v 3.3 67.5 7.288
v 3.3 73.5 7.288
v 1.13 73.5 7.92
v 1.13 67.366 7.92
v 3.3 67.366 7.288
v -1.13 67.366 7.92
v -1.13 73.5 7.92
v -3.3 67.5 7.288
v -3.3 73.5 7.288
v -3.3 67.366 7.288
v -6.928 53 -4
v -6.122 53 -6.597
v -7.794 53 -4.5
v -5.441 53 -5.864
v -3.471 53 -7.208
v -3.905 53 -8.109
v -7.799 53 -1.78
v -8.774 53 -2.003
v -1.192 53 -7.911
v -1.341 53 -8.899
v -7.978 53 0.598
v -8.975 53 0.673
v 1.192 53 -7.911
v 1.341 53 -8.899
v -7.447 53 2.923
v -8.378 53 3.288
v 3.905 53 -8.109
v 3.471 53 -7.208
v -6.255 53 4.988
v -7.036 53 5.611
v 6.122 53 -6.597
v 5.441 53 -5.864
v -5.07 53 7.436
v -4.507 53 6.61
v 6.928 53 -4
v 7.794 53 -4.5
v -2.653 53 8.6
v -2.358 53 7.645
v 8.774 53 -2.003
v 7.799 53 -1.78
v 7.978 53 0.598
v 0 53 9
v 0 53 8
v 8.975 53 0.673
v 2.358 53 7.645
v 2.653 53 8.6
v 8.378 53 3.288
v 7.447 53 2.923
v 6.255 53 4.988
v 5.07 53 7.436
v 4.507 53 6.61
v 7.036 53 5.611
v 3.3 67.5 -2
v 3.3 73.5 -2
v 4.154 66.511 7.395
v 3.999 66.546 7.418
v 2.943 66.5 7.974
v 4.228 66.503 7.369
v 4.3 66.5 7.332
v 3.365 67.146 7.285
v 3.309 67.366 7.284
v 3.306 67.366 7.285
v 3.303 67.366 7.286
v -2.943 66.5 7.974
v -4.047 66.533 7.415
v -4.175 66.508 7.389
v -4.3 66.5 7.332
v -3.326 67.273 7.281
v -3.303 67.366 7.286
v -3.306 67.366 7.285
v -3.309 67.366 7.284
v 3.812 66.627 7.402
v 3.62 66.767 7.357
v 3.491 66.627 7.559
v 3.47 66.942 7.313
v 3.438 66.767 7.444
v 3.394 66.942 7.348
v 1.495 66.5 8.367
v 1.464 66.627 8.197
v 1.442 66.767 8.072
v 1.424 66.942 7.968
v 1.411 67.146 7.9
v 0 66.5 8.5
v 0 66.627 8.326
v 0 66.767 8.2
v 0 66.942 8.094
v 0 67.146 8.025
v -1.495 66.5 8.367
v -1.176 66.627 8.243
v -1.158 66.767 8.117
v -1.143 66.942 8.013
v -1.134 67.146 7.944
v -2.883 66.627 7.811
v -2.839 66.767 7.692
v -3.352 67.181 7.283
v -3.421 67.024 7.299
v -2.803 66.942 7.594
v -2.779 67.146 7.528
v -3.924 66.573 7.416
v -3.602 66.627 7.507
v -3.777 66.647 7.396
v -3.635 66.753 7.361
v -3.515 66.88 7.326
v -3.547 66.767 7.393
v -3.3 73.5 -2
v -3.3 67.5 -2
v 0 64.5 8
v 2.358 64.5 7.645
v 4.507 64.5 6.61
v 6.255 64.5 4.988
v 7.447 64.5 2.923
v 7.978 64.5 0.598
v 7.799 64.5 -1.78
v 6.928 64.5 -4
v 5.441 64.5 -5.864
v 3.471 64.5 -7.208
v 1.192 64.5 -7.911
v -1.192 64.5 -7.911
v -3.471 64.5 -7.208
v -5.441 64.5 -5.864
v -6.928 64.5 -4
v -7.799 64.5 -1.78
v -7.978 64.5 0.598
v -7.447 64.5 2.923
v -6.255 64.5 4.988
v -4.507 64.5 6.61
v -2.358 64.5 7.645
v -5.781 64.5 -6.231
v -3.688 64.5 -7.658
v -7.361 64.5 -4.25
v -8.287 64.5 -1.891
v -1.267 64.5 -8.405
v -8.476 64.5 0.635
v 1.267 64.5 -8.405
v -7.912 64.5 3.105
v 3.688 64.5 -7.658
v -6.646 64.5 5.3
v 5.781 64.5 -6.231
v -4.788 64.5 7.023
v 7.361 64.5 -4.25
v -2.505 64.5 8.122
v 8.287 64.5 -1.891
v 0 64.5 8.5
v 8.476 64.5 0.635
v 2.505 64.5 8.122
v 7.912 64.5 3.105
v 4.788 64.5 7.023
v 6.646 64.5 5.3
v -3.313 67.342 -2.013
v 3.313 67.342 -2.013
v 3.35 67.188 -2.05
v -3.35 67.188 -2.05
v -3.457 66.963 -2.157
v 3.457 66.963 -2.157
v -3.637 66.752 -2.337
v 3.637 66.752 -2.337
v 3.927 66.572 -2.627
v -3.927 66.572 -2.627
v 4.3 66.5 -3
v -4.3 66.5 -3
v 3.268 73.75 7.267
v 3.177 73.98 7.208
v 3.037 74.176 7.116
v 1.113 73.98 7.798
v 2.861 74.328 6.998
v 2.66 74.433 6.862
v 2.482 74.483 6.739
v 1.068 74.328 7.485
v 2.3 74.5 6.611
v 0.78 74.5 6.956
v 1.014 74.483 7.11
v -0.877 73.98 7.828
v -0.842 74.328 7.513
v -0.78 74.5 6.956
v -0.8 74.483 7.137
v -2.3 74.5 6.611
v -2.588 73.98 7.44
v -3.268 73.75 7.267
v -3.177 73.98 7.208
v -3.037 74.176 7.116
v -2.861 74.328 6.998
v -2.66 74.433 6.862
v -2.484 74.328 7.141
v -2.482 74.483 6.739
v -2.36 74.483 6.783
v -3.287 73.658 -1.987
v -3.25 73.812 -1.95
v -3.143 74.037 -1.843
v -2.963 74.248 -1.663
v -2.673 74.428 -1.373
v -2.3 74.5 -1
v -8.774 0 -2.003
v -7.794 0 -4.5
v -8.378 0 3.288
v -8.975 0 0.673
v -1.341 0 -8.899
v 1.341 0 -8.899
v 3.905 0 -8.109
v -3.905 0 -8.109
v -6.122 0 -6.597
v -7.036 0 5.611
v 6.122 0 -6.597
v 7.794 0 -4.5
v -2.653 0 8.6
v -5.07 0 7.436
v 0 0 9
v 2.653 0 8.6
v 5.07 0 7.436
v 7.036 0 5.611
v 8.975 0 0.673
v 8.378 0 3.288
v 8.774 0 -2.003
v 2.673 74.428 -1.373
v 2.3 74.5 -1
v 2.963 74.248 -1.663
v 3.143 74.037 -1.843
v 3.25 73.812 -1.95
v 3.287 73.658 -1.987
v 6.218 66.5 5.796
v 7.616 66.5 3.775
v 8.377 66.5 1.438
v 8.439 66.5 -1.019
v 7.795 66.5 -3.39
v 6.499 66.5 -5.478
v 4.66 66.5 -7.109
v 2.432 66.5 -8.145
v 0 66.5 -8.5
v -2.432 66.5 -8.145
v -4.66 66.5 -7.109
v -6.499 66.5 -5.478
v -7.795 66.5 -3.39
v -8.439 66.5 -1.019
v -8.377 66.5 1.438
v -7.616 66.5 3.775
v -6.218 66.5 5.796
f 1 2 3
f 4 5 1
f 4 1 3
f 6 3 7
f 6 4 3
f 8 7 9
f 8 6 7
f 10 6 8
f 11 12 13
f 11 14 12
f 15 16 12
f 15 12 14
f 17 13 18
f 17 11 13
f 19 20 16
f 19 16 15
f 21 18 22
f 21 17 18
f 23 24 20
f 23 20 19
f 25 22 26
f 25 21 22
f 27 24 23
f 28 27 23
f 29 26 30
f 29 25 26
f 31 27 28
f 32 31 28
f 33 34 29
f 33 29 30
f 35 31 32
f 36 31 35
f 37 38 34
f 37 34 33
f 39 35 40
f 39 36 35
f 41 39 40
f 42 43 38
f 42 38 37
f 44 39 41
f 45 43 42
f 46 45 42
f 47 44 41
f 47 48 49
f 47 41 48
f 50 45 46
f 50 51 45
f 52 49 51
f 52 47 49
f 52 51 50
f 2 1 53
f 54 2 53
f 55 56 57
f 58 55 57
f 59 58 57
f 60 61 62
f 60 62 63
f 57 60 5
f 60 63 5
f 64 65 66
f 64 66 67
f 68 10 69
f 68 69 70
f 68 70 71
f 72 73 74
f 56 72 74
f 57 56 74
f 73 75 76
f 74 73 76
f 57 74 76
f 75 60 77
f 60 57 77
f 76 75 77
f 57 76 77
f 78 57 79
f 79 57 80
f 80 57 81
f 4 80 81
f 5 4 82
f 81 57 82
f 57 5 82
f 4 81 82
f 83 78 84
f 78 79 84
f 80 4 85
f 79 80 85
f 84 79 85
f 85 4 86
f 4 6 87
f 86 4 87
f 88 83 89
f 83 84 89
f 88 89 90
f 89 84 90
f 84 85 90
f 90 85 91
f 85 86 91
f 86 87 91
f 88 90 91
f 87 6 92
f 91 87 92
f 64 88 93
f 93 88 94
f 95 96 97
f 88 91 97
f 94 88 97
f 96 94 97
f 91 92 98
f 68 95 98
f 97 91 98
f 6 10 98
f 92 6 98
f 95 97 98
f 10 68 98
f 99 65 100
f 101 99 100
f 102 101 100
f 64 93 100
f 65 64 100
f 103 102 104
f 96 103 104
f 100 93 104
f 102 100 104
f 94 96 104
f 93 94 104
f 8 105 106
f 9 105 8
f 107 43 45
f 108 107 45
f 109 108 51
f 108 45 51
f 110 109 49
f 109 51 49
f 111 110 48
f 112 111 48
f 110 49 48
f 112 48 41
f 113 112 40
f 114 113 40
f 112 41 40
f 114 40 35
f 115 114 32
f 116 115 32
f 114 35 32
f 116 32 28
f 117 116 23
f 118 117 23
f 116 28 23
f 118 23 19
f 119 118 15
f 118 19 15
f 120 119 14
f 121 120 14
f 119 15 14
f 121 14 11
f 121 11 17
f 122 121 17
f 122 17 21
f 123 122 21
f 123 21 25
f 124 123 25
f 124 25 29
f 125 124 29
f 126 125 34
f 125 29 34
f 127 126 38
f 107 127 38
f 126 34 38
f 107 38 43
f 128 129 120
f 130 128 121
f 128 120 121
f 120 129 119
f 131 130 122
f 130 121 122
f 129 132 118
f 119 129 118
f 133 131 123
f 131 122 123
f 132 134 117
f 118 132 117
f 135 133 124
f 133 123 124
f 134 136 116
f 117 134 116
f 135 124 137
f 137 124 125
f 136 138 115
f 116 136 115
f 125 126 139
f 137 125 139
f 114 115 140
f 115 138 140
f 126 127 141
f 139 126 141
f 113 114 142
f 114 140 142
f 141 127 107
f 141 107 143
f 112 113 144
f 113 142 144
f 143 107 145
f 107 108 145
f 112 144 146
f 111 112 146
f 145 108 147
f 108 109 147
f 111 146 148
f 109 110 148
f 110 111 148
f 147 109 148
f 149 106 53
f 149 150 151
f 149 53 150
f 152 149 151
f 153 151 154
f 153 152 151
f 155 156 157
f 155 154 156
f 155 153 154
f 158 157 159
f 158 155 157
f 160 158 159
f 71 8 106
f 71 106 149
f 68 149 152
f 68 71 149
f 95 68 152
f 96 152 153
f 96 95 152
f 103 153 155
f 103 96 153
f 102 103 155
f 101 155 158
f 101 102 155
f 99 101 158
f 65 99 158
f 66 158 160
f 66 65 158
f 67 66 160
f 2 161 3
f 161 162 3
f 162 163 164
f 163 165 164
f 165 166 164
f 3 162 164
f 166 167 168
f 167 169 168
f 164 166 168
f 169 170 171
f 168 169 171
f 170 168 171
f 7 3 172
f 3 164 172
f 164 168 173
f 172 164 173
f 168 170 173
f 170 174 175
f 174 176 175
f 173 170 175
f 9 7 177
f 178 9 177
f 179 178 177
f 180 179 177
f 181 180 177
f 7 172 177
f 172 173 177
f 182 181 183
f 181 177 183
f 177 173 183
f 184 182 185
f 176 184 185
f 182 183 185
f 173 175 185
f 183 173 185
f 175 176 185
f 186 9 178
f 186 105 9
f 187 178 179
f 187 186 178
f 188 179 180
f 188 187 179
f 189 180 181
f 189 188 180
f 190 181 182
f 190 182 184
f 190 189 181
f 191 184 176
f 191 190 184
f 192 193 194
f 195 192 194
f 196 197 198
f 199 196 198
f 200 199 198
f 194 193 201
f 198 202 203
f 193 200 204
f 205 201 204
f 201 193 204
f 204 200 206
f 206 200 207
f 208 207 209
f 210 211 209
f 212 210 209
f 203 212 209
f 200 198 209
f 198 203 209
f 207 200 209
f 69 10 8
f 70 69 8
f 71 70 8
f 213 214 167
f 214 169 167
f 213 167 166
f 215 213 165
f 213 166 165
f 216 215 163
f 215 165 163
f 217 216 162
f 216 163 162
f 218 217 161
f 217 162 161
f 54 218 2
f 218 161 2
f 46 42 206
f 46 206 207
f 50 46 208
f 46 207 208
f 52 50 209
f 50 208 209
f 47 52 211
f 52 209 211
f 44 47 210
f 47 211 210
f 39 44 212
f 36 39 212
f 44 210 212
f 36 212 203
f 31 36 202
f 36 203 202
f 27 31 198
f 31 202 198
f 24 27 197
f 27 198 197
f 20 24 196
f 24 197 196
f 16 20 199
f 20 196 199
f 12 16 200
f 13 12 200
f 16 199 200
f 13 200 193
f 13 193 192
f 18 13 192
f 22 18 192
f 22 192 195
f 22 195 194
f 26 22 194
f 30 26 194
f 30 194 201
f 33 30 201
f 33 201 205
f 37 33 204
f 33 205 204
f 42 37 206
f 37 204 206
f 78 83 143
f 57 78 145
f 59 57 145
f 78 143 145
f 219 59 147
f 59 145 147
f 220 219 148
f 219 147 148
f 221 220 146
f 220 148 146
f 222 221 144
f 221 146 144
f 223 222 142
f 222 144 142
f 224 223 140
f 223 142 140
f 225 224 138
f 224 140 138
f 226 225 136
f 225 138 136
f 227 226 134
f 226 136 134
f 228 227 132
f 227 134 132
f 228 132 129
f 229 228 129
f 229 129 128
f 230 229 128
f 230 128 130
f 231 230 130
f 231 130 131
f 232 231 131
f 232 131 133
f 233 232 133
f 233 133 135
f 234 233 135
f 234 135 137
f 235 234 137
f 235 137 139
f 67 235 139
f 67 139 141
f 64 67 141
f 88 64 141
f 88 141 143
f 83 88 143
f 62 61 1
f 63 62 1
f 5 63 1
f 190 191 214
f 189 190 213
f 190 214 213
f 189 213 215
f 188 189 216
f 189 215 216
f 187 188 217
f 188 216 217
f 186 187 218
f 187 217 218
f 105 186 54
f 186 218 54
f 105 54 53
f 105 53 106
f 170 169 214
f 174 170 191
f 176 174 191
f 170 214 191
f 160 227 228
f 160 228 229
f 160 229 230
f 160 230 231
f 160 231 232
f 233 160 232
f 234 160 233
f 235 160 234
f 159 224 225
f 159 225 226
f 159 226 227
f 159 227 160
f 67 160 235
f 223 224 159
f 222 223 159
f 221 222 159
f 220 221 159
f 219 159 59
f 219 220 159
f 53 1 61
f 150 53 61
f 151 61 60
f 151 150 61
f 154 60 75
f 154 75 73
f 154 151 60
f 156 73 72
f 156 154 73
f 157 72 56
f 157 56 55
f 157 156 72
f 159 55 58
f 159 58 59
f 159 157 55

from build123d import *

# Parameters (mm, degrees)
CROQUIS1_R              = 9
SALIENTE_EXTRUIR1_DEPTH = 53
CROQUIS2_R              = 8
SALIENTE_EXTRUIR2_DEPTH = 11.5
CROQUIS3_R              = 8.5
SALIENTE_EXTRUIR3_DEPTH = 2
SALIENTE_EXTRUIR4_DEPTH = 8
REDONDEO1_R             = 1
REDONDEO2_R             = 1


with BuildPart() as part:
    # Croquis1 → Saliente-Extruir1 (new body)
    with BuildSketch(Plane(origin=(0, 0, 0), x_dir=(1, 0, 0), z_dir=(0, 1, 0))):
        with Locations(Location((0, 0, 0), (0, 0, 270))):
            Circle(CROQUIS1_R)
    extrude(amount=SALIENTE_EXTRUIR1_DEPTH)

    # Croquis2 → Saliente-Extruir2 (add)
    with BuildSketch(Plane(origin=(0, 53, 0), x_dir=(1, 0, 0), z_dir=(0, 1, 0))):
        with Locations(Location((0, 0, 0), (0, 0, 270))):
            Circle(CROQUIS2_R)
    extrude(amount=SALIENTE_EXTRUIR2_DEPTH)

    # Croquis3 → Saliente-Extruir3 (add)
    with BuildSketch(Plane(origin=(0, 64.5, 0), x_dir=(1, 0, 0), z_dir=(0, 1, 0))):
        with Locations(Location((0, 0, 0), (0, 0, 270))):
            Circle(CROQUIS3_R)
    extrude(amount=SALIENTE_EXTRUIR3_DEPTH)

    # Croquis4 → Saliente-Extruir4 (add)
    with BuildSketch(Plane(origin=(0, 66.5, 0), x_dir=(1, 0, 0), z_dir=(0, 1, 0))):
        with BuildLine():
            Line((-3.3, -7.287660804), (-3.3, 2))
            Line((-3.3, 2), (3.3, 2))
            Line((3.3, 2), (3.3, -7.287660804))
            ThreePointArc((3.3, -7.287660804), (0, -8), (-3.3, -7.287660804))
        make_face()
    extrude(amount=SALIENTE_EXTRUIR4_DEPTH)

    # Redondeo1
    # the kernel refuses this fillet: 1 mm, written as the material it adds along each edge
    with BuildSketch(Plane(origin=(0, 66.5, 0), x_dir=(0.6410468977600248, 0, 0.7675017100125893), z_dir=(0.7675017100125893, 0, -0.6410468977600248))) as redondeo1_piece_1_section:
        with BuildLine():
            CenterArc((9, -0.866025404), REDONDEO1_R, 120, 60)
            Line((8, -0.866025404), (7.98, -0.866025404))
            Line((7.98, -0.866025404), (7.98, 0))
            Line((7.98, 0), (8, 0.02))
            ThreePointArc((8, 0.02), (8.25, 0.02), (8.49, 0.017320508))
            Line((8.49, 0.017320508), (8.5, 0))
        make_face()
    redondeo1_piece_1 = revolve(axis=Axis((0, 66.5, 0), (0, -1, 0)), revolution_arc=79.739856792, mode=Mode.PRIVATE)
    redondeo1_piece_1 = split(redondeo1_piece_1, bisect_by=Plane(origin=(3.3, 66.860958569, 8.125198581), z_dir=(-1, 0, 0)), keep=Keep.TOP, mode=Mode.PRIVATE)
    redondeo1_piece_1 = split(redondeo1_piece_1, bisect_by=Plane(origin=(-3.3, 66.860958569, 8.125198581), z_dir=(1, 0, 0)), keep=Keep.TOP, mode=Mode.PRIVATE)
    add(redondeo1_piece_1)
    with BuildSketch(Plane(origin=(3.3, 66.5, -2), x_dir=(1, 0, 0), z_dir=(0, 0, 1))) as redondeo1_piece_2_section:
        with BuildLine():
            CenterArc((REDONDEO1_R, REDONDEO1_R), REDONDEO1_R, 180, 90)
            Line((0, REDONDEO1_R), (-REDONDEO1_R * 0.02, REDONDEO1_R))
            Line((-REDONDEO1_R * 0.02, REDONDEO1_R), (-REDONDEO1_R * 0.02, -REDONDEO1_R * 0.02))
            Line((-REDONDEO1_R * 0.02, -REDONDEO1_R * 0.02), (REDONDEO1_R, -REDONDEO1_R * 0.02))
            Line((REDONDEO1_R, -REDONDEO1_R * 0.02), (REDONDEO1_R, 0))
        make_face()
    redondeo1_piece_2 = extrude(amount=11.787660804, mode=Mode.PRIVATE)
    redondeo1_piece_2 = redondeo1_piece_2 & Plane(origin=(0, 66.727902146, 0), x_dir=(0.4124999999999996, 0, 0.9109576005501028), z_dir=(0, -1, 0)) * Cylinder(8, 28, mode=Mode.PRIVATE)
    add(redondeo1_piece_2)
    with BuildSketch(Plane(origin=(-3.3, 66.5, -2), x_dir=(0, 0, -1), z_dir=(1, 0, 0))) as redondeo1_piece_3:
        with BuildLine():
            CenterArc((REDONDEO1_R, REDONDEO1_R), REDONDEO1_R, 180, 90)
            Line((0, REDONDEO1_R), (-REDONDEO1_R * 0.02, REDONDEO1_R))
            Line((-REDONDEO1_R * 0.02, REDONDEO1_R), (-REDONDEO1_R * 0.02, -REDONDEO1_R * 0.02))
            Line((-REDONDEO1_R * 0.02, -REDONDEO1_R * 0.02), (REDONDEO1_R, -REDONDEO1_R * 0.02))
            Line((REDONDEO1_R, -REDONDEO1_R * 0.02), (REDONDEO1_R, 0))
        make_face()
    extrude(amount=6.6)
    with BuildSketch(Plane(origin=(-3.3, 66.5, 9.787660804), x_dir=(-1, 0, 0), z_dir=(0, 0, -1))) as redondeo1_piece_4_section:
        with BuildLine():
            CenterArc((REDONDEO1_R, REDONDEO1_R), REDONDEO1_R, 180, 90)
            Line((0, REDONDEO1_R), (-REDONDEO1_R * 0.02, REDONDEO1_R))
            Line((-REDONDEO1_R * 0.02, REDONDEO1_R), (-REDONDEO1_R * 0.02, -REDONDEO1_R * 0.02))
            Line((-REDONDEO1_R * 0.02, -REDONDEO1_R * 0.02), (REDONDEO1_R, -REDONDEO1_R * 0.02))
            Line((REDONDEO1_R, -REDONDEO1_R * 0.02), (REDONDEO1_R, 0))
        make_face()
    redondeo1_piece_4 = extrude(amount=11.787660804, mode=Mode.PRIVATE)
    redondeo1_piece_4 = redondeo1_piece_4 & Plane(origin=(0, 66.727902035, 0), x_dir=(0.4124999999999996, 0, 0.9109576005501028), z_dir=(0, -1, 0)) * Cylinder(8, 28, mode=Mode.PRIVATE)
    add(redondeo1_piece_4)
    with BuildSketch(Plane(origin=(0, 66.5, 0), x_dir=(0.6410468977600248, 0, 0.7675017100125893), z_dir=(0.7675017100125893, 0, -0.6410468977600248))) as redondeo1_piece_5a_section:
        with BuildLine():
            CenterArc((9, -0.866025404), REDONDEO1_R, 120, 60)
            Line((8, -0.866025404), (7.98, -0.866025404))
            Line((7.98, -0.866025404), (7.98, 0))
            Line((7.98, 0), (8, 0.02))
            ThreePointArc((8, 0.02), (8.25, 0.02), (8.49, 0.017320508))
            Line((8.49, 0.017320508), (8.5, 0))
        make_face()
    redondeo1_piece_5a = revolve(axis=Axis((0, 66.5, 0), (0, -1, 0)), revolution_arc=79.739856792, mode=Mode.PRIVATE)
    redondeo1_piece_5a = split(redondeo1_piece_5a, bisect_by=Plane(origin=(3.3, 66.711912265, 6.883204996), z_dir=(1, 0, 0)), keep=Keep.TOP, mode=Mode.PRIVATE)
    with BuildSketch(Plane(origin=(3.3, 66.5, -2), x_dir=(1, 0, 0), z_dir=(0, 0, 1))) as redondeo1_piece_5b_section:
        with BuildLine():
            CenterArc((REDONDEO1_R, REDONDEO1_R), REDONDEO1_R, 180, 90)
            Line((0, REDONDEO1_R), (-REDONDEO1_R * 0.02, REDONDEO1_R))
            Line((-REDONDEO1_R * 0.02, REDONDEO1_R), (-REDONDEO1_R * 0.02, -REDONDEO1_R * 0.02))
            Line((-REDONDEO1_R * 0.02, -REDONDEO1_R * 0.02), (REDONDEO1_R, -REDONDEO1_R * 0.02))
            Line((REDONDEO1_R, -REDONDEO1_R * 0.02), (REDONDEO1_R, 0))
        make_face()
    redondeo1_piece_5b = extrude(amount=11.787660804, mode=Mode.PRIVATE)
    redondeo1_piece_5b = redondeo1_piece_5b & Plane(origin=(0, 66.724587575, 0), x_dir=(0, 0, 1), z_dir=(0, -1, 0)) * Cylinder(8.5, 28, mode=Mode.PRIVATE)
    redondeo1_piece_5b = redondeo1_piece_5b - Plane(origin=(0, 66.724587575, 0), x_dir=(0.4124999999999996, 0, 0.9109576005501028), z_dir=(0, -1, 0)) * Cylinder(8, 28, mode=Mode.PRIVATE)
    redondeo1_piece_5 = redondeo1_piece_5a & redondeo1_piece_5b
    add(redondeo1_piece_5)
    with BuildSketch(Plane(origin=(0, 66.5, 0), x_dir=(0.6410468977600248, 0, 0.7675017100125893), z_dir=(0.7675017100125893, 0, -0.6410468977600248))) as redondeo1_piece_6a_section:
        with BuildLine():
            CenterArc((9, -0.866025404), REDONDEO1_R, 120, 60)
            Line((8, -0.866025404), (7.98, -0.866025404))
            Line((7.98, -0.866025404), (7.98, 0))
            Line((7.98, 0), (8, 0.02))
            ThreePointArc((8, 0.02), (8.25, 0.02), (8.49, 0.017320508))
            Line((8.49, 0.017320508), (8.5, 0))
        make_face()
    redondeo1_piece_6a = revolve(axis=Axis((0, 66.5, 0), (0, -1, 0)), revolution_arc=79.739856792, mode=Mode.PRIVATE)
    redondeo1_piece_6a = split(redondeo1_piece_6a, bisect_by=Plane(origin=(-3.3, 66.71191226, 6.883204989), z_dir=(-1, 0, 0)), keep=Keep.TOP, mode=Mode.PRIVATE)
    with BuildSketch(Plane(origin=(-3.3, 66.5, 9.787660804), x_dir=(-1, 0, 0), z_dir=(0, 0, -1))) as redondeo1_piece_6b_section:
        with BuildLine():
            CenterArc((REDONDEO1_R, REDONDEO1_R), REDONDEO1_R, 180, 90)
            Line((0, REDONDEO1_R), (-REDONDEO1_R * 0.02, REDONDEO1_R))
            Line((-REDONDEO1_R * 0.02, REDONDEO1_R), (-REDONDEO1_R * 0.02, -REDONDEO1_R * 0.02))
            Line((-REDONDEO1_R * 0.02, -REDONDEO1_R * 0.02), (REDONDEO1_R, -REDONDEO1_R * 0.02))
            Line((REDONDEO1_R, -REDONDEO1_R * 0.02), (REDONDEO1_R, 0))
        make_face()
    redondeo1_piece_6b = extrude(amount=11.787660804, mode=Mode.PRIVATE)
    redondeo1_piece_6b = redondeo1_piece_6b & Plane(origin=(0, 66.72458755, 0), x_dir=(0, 0, 1), z_dir=(0, -1, 0)) * Cylinder(8.5, 28, mode=Mode.PRIVATE)
    redondeo1_piece_6b = redondeo1_piece_6b - Plane(origin=(0, 66.72458755, 0), x_dir=(0.4124999999999996, 0, 0.9109576005501028), z_dir=(0, -1, 0)) * Cylinder(8, 28, mode=Mode.PRIVATE)
    redondeo1_piece_6 = redondeo1_piece_6a & redondeo1_piece_6b
    add(redondeo1_piece_6)
    with BuildSketch(Plane(origin=(3.3, 66.5, -4.5), x_dir=(1, 0, 0), z_dir=(0, 0, 1))) as redondeo1_piece_7a_section:
        with BuildLine():
            CenterArc((REDONDEO1_R, REDONDEO1_R), REDONDEO1_R, 180, 90)
            Line((0, REDONDEO1_R), (-REDONDEO1_R * 0.02, REDONDEO1_R))
            Line((-REDONDEO1_R * 0.02, REDONDEO1_R), (-REDONDEO1_R * 0.02, -REDONDEO1_R * 0.02))
            Line((-REDONDEO1_R * 0.02, -REDONDEO1_R * 0.02), (REDONDEO1_R, -REDONDEO1_R * 0.02))
            Line((REDONDEO1_R, -REDONDEO1_R * 0.02), (REDONDEO1_R, 0))
        make_face()
    redondeo1_piece_7a = extrude(amount=14.287660804, mode=Mode.PRIVATE)
    redondeo1_piece_7a = split(redondeo1_piece_7a, bisect_by=Plane(origin=(3.526395114, 66.726395114, -2), z_dir=(0, 0, -1)), keep=Keep.TOP, mode=Mode.PRIVATE)
    with BuildSketch(Plane(origin=(-3.3, 66.5, -2), x_dir=(0, 0, -1), z_dir=(1, 0, 0))) as redondeo1_piece_7b_section:
        with BuildLine():
            CenterArc((REDONDEO1_R, REDONDEO1_R), REDONDEO1_R, 180, 90)
            Line((0, REDONDEO1_R), (-REDONDEO1_R * 0.02, REDONDEO1_R))
            Line((-REDONDEO1_R * 0.02, REDONDEO1_R), (-REDONDEO1_R * 0.02, -REDONDEO1_R * 0.02))
            Line((-REDONDEO1_R * 0.02, -REDONDEO1_R * 0.02), (REDONDEO1_R, -REDONDEO1_R * 0.02))
            Line((REDONDEO1_R, -REDONDEO1_R * 0.02), (REDONDEO1_R, 0))
        make_face()
    redondeo1_piece_7b = extrude(amount=9.1, mode=Mode.PRIVATE)
    redondeo1_piece_7b = split(redondeo1_piece_7b, bisect_by=Plane(origin=(3.3, 66.726395114, -2.226395114), z_dir=(1, 0, 0)), keep=Keep.TOP, mode=Mode.PRIVATE)
    redondeo1_piece_7 = redondeo1_piece_7a & redondeo1_piece_7b
    add(redondeo1_piece_7)
    with BuildSketch(Plane(origin=(-5.8, 66.5, -2), x_dir=(0, 0, -1), z_dir=(1, 0, 0))) as redondeo1_piece_8a_section:
        with BuildLine():
            CenterArc((REDONDEO1_R, REDONDEO1_R), REDONDEO1_R, 180, 90)
            Line((0, REDONDEO1_R), (-REDONDEO1_R * 0.02, REDONDEO1_R))
            Line((-REDONDEO1_R * 0.02, REDONDEO1_R), (-REDONDEO1_R * 0.02, -REDONDEO1_R * 0.02))
            Line((-REDONDEO1_R * 0.02, -REDONDEO1_R * 0.02), (REDONDEO1_R, -REDONDEO1_R * 0.02))
            Line((REDONDEO1_R, -REDONDEO1_R * 0.02), (REDONDEO1_R, 0))
        make_face()
    redondeo1_piece_8a = extrude(amount=9.1, mode=Mode.PRIVATE)
    redondeo1_piece_8a = split(redondeo1_piece_8a, bisect_by=Plane(origin=(-3.3, 66.726395114, -2.226395114), z_dir=(-1, 0, 0)), keep=Keep.TOP, mode=Mode.PRIVATE)
    with BuildSketch(Plane(origin=(-3.3, 66.5, 9.787660804), x_dir=(-1, 0, 0), z_dir=(0, 0, -1))) as redondeo1_piece_8b_section:
        with BuildLine():
            CenterArc((REDONDEO1_R, REDONDEO1_R), REDONDEO1_R, 180, 90)
            Line((0, REDONDEO1_R), (-REDONDEO1_R * 0.02, REDONDEO1_R))
            Line((-REDONDEO1_R * 0.02, REDONDEO1_R), (-REDONDEO1_R * 0.02, -REDONDEO1_R * 0.02))
            Line((-REDONDEO1_R * 0.02, -REDONDEO1_R * 0.02), (REDONDEO1_R, -REDONDEO1_R * 0.02))
            Line((REDONDEO1_R, -REDONDEO1_R * 0.02), (REDONDEO1_R, 0))
        make_face()
    redondeo1_piece_8b = extrude(amount=14.287660804, mode=Mode.PRIVATE)
    redondeo1_piece_8b = split(redondeo1_piece_8b, bisect_by=Plane(origin=(-3.526395114, 66.726395114, -2), z_dir=(0, 0, -1)), keep=Keep.TOP, mode=Mode.PRIVATE)
    redondeo1_piece_8 = redondeo1_piece_8a & redondeo1_piece_8b
    add(redondeo1_piece_8)

    # Redondeo2
    redondeo2_edges = [part.edges().sort_by_distance(p)[0] for p in [
        (0, 74.5, 8),
        (3.3, 74.5, 2.643830402),
        (0, 74.5, -2),
        (-3.3, 74.5, 2.643830402),
    ]]
    fillet(redondeo2_edges, radius=REDONDEO2_R)


solid = part.part
